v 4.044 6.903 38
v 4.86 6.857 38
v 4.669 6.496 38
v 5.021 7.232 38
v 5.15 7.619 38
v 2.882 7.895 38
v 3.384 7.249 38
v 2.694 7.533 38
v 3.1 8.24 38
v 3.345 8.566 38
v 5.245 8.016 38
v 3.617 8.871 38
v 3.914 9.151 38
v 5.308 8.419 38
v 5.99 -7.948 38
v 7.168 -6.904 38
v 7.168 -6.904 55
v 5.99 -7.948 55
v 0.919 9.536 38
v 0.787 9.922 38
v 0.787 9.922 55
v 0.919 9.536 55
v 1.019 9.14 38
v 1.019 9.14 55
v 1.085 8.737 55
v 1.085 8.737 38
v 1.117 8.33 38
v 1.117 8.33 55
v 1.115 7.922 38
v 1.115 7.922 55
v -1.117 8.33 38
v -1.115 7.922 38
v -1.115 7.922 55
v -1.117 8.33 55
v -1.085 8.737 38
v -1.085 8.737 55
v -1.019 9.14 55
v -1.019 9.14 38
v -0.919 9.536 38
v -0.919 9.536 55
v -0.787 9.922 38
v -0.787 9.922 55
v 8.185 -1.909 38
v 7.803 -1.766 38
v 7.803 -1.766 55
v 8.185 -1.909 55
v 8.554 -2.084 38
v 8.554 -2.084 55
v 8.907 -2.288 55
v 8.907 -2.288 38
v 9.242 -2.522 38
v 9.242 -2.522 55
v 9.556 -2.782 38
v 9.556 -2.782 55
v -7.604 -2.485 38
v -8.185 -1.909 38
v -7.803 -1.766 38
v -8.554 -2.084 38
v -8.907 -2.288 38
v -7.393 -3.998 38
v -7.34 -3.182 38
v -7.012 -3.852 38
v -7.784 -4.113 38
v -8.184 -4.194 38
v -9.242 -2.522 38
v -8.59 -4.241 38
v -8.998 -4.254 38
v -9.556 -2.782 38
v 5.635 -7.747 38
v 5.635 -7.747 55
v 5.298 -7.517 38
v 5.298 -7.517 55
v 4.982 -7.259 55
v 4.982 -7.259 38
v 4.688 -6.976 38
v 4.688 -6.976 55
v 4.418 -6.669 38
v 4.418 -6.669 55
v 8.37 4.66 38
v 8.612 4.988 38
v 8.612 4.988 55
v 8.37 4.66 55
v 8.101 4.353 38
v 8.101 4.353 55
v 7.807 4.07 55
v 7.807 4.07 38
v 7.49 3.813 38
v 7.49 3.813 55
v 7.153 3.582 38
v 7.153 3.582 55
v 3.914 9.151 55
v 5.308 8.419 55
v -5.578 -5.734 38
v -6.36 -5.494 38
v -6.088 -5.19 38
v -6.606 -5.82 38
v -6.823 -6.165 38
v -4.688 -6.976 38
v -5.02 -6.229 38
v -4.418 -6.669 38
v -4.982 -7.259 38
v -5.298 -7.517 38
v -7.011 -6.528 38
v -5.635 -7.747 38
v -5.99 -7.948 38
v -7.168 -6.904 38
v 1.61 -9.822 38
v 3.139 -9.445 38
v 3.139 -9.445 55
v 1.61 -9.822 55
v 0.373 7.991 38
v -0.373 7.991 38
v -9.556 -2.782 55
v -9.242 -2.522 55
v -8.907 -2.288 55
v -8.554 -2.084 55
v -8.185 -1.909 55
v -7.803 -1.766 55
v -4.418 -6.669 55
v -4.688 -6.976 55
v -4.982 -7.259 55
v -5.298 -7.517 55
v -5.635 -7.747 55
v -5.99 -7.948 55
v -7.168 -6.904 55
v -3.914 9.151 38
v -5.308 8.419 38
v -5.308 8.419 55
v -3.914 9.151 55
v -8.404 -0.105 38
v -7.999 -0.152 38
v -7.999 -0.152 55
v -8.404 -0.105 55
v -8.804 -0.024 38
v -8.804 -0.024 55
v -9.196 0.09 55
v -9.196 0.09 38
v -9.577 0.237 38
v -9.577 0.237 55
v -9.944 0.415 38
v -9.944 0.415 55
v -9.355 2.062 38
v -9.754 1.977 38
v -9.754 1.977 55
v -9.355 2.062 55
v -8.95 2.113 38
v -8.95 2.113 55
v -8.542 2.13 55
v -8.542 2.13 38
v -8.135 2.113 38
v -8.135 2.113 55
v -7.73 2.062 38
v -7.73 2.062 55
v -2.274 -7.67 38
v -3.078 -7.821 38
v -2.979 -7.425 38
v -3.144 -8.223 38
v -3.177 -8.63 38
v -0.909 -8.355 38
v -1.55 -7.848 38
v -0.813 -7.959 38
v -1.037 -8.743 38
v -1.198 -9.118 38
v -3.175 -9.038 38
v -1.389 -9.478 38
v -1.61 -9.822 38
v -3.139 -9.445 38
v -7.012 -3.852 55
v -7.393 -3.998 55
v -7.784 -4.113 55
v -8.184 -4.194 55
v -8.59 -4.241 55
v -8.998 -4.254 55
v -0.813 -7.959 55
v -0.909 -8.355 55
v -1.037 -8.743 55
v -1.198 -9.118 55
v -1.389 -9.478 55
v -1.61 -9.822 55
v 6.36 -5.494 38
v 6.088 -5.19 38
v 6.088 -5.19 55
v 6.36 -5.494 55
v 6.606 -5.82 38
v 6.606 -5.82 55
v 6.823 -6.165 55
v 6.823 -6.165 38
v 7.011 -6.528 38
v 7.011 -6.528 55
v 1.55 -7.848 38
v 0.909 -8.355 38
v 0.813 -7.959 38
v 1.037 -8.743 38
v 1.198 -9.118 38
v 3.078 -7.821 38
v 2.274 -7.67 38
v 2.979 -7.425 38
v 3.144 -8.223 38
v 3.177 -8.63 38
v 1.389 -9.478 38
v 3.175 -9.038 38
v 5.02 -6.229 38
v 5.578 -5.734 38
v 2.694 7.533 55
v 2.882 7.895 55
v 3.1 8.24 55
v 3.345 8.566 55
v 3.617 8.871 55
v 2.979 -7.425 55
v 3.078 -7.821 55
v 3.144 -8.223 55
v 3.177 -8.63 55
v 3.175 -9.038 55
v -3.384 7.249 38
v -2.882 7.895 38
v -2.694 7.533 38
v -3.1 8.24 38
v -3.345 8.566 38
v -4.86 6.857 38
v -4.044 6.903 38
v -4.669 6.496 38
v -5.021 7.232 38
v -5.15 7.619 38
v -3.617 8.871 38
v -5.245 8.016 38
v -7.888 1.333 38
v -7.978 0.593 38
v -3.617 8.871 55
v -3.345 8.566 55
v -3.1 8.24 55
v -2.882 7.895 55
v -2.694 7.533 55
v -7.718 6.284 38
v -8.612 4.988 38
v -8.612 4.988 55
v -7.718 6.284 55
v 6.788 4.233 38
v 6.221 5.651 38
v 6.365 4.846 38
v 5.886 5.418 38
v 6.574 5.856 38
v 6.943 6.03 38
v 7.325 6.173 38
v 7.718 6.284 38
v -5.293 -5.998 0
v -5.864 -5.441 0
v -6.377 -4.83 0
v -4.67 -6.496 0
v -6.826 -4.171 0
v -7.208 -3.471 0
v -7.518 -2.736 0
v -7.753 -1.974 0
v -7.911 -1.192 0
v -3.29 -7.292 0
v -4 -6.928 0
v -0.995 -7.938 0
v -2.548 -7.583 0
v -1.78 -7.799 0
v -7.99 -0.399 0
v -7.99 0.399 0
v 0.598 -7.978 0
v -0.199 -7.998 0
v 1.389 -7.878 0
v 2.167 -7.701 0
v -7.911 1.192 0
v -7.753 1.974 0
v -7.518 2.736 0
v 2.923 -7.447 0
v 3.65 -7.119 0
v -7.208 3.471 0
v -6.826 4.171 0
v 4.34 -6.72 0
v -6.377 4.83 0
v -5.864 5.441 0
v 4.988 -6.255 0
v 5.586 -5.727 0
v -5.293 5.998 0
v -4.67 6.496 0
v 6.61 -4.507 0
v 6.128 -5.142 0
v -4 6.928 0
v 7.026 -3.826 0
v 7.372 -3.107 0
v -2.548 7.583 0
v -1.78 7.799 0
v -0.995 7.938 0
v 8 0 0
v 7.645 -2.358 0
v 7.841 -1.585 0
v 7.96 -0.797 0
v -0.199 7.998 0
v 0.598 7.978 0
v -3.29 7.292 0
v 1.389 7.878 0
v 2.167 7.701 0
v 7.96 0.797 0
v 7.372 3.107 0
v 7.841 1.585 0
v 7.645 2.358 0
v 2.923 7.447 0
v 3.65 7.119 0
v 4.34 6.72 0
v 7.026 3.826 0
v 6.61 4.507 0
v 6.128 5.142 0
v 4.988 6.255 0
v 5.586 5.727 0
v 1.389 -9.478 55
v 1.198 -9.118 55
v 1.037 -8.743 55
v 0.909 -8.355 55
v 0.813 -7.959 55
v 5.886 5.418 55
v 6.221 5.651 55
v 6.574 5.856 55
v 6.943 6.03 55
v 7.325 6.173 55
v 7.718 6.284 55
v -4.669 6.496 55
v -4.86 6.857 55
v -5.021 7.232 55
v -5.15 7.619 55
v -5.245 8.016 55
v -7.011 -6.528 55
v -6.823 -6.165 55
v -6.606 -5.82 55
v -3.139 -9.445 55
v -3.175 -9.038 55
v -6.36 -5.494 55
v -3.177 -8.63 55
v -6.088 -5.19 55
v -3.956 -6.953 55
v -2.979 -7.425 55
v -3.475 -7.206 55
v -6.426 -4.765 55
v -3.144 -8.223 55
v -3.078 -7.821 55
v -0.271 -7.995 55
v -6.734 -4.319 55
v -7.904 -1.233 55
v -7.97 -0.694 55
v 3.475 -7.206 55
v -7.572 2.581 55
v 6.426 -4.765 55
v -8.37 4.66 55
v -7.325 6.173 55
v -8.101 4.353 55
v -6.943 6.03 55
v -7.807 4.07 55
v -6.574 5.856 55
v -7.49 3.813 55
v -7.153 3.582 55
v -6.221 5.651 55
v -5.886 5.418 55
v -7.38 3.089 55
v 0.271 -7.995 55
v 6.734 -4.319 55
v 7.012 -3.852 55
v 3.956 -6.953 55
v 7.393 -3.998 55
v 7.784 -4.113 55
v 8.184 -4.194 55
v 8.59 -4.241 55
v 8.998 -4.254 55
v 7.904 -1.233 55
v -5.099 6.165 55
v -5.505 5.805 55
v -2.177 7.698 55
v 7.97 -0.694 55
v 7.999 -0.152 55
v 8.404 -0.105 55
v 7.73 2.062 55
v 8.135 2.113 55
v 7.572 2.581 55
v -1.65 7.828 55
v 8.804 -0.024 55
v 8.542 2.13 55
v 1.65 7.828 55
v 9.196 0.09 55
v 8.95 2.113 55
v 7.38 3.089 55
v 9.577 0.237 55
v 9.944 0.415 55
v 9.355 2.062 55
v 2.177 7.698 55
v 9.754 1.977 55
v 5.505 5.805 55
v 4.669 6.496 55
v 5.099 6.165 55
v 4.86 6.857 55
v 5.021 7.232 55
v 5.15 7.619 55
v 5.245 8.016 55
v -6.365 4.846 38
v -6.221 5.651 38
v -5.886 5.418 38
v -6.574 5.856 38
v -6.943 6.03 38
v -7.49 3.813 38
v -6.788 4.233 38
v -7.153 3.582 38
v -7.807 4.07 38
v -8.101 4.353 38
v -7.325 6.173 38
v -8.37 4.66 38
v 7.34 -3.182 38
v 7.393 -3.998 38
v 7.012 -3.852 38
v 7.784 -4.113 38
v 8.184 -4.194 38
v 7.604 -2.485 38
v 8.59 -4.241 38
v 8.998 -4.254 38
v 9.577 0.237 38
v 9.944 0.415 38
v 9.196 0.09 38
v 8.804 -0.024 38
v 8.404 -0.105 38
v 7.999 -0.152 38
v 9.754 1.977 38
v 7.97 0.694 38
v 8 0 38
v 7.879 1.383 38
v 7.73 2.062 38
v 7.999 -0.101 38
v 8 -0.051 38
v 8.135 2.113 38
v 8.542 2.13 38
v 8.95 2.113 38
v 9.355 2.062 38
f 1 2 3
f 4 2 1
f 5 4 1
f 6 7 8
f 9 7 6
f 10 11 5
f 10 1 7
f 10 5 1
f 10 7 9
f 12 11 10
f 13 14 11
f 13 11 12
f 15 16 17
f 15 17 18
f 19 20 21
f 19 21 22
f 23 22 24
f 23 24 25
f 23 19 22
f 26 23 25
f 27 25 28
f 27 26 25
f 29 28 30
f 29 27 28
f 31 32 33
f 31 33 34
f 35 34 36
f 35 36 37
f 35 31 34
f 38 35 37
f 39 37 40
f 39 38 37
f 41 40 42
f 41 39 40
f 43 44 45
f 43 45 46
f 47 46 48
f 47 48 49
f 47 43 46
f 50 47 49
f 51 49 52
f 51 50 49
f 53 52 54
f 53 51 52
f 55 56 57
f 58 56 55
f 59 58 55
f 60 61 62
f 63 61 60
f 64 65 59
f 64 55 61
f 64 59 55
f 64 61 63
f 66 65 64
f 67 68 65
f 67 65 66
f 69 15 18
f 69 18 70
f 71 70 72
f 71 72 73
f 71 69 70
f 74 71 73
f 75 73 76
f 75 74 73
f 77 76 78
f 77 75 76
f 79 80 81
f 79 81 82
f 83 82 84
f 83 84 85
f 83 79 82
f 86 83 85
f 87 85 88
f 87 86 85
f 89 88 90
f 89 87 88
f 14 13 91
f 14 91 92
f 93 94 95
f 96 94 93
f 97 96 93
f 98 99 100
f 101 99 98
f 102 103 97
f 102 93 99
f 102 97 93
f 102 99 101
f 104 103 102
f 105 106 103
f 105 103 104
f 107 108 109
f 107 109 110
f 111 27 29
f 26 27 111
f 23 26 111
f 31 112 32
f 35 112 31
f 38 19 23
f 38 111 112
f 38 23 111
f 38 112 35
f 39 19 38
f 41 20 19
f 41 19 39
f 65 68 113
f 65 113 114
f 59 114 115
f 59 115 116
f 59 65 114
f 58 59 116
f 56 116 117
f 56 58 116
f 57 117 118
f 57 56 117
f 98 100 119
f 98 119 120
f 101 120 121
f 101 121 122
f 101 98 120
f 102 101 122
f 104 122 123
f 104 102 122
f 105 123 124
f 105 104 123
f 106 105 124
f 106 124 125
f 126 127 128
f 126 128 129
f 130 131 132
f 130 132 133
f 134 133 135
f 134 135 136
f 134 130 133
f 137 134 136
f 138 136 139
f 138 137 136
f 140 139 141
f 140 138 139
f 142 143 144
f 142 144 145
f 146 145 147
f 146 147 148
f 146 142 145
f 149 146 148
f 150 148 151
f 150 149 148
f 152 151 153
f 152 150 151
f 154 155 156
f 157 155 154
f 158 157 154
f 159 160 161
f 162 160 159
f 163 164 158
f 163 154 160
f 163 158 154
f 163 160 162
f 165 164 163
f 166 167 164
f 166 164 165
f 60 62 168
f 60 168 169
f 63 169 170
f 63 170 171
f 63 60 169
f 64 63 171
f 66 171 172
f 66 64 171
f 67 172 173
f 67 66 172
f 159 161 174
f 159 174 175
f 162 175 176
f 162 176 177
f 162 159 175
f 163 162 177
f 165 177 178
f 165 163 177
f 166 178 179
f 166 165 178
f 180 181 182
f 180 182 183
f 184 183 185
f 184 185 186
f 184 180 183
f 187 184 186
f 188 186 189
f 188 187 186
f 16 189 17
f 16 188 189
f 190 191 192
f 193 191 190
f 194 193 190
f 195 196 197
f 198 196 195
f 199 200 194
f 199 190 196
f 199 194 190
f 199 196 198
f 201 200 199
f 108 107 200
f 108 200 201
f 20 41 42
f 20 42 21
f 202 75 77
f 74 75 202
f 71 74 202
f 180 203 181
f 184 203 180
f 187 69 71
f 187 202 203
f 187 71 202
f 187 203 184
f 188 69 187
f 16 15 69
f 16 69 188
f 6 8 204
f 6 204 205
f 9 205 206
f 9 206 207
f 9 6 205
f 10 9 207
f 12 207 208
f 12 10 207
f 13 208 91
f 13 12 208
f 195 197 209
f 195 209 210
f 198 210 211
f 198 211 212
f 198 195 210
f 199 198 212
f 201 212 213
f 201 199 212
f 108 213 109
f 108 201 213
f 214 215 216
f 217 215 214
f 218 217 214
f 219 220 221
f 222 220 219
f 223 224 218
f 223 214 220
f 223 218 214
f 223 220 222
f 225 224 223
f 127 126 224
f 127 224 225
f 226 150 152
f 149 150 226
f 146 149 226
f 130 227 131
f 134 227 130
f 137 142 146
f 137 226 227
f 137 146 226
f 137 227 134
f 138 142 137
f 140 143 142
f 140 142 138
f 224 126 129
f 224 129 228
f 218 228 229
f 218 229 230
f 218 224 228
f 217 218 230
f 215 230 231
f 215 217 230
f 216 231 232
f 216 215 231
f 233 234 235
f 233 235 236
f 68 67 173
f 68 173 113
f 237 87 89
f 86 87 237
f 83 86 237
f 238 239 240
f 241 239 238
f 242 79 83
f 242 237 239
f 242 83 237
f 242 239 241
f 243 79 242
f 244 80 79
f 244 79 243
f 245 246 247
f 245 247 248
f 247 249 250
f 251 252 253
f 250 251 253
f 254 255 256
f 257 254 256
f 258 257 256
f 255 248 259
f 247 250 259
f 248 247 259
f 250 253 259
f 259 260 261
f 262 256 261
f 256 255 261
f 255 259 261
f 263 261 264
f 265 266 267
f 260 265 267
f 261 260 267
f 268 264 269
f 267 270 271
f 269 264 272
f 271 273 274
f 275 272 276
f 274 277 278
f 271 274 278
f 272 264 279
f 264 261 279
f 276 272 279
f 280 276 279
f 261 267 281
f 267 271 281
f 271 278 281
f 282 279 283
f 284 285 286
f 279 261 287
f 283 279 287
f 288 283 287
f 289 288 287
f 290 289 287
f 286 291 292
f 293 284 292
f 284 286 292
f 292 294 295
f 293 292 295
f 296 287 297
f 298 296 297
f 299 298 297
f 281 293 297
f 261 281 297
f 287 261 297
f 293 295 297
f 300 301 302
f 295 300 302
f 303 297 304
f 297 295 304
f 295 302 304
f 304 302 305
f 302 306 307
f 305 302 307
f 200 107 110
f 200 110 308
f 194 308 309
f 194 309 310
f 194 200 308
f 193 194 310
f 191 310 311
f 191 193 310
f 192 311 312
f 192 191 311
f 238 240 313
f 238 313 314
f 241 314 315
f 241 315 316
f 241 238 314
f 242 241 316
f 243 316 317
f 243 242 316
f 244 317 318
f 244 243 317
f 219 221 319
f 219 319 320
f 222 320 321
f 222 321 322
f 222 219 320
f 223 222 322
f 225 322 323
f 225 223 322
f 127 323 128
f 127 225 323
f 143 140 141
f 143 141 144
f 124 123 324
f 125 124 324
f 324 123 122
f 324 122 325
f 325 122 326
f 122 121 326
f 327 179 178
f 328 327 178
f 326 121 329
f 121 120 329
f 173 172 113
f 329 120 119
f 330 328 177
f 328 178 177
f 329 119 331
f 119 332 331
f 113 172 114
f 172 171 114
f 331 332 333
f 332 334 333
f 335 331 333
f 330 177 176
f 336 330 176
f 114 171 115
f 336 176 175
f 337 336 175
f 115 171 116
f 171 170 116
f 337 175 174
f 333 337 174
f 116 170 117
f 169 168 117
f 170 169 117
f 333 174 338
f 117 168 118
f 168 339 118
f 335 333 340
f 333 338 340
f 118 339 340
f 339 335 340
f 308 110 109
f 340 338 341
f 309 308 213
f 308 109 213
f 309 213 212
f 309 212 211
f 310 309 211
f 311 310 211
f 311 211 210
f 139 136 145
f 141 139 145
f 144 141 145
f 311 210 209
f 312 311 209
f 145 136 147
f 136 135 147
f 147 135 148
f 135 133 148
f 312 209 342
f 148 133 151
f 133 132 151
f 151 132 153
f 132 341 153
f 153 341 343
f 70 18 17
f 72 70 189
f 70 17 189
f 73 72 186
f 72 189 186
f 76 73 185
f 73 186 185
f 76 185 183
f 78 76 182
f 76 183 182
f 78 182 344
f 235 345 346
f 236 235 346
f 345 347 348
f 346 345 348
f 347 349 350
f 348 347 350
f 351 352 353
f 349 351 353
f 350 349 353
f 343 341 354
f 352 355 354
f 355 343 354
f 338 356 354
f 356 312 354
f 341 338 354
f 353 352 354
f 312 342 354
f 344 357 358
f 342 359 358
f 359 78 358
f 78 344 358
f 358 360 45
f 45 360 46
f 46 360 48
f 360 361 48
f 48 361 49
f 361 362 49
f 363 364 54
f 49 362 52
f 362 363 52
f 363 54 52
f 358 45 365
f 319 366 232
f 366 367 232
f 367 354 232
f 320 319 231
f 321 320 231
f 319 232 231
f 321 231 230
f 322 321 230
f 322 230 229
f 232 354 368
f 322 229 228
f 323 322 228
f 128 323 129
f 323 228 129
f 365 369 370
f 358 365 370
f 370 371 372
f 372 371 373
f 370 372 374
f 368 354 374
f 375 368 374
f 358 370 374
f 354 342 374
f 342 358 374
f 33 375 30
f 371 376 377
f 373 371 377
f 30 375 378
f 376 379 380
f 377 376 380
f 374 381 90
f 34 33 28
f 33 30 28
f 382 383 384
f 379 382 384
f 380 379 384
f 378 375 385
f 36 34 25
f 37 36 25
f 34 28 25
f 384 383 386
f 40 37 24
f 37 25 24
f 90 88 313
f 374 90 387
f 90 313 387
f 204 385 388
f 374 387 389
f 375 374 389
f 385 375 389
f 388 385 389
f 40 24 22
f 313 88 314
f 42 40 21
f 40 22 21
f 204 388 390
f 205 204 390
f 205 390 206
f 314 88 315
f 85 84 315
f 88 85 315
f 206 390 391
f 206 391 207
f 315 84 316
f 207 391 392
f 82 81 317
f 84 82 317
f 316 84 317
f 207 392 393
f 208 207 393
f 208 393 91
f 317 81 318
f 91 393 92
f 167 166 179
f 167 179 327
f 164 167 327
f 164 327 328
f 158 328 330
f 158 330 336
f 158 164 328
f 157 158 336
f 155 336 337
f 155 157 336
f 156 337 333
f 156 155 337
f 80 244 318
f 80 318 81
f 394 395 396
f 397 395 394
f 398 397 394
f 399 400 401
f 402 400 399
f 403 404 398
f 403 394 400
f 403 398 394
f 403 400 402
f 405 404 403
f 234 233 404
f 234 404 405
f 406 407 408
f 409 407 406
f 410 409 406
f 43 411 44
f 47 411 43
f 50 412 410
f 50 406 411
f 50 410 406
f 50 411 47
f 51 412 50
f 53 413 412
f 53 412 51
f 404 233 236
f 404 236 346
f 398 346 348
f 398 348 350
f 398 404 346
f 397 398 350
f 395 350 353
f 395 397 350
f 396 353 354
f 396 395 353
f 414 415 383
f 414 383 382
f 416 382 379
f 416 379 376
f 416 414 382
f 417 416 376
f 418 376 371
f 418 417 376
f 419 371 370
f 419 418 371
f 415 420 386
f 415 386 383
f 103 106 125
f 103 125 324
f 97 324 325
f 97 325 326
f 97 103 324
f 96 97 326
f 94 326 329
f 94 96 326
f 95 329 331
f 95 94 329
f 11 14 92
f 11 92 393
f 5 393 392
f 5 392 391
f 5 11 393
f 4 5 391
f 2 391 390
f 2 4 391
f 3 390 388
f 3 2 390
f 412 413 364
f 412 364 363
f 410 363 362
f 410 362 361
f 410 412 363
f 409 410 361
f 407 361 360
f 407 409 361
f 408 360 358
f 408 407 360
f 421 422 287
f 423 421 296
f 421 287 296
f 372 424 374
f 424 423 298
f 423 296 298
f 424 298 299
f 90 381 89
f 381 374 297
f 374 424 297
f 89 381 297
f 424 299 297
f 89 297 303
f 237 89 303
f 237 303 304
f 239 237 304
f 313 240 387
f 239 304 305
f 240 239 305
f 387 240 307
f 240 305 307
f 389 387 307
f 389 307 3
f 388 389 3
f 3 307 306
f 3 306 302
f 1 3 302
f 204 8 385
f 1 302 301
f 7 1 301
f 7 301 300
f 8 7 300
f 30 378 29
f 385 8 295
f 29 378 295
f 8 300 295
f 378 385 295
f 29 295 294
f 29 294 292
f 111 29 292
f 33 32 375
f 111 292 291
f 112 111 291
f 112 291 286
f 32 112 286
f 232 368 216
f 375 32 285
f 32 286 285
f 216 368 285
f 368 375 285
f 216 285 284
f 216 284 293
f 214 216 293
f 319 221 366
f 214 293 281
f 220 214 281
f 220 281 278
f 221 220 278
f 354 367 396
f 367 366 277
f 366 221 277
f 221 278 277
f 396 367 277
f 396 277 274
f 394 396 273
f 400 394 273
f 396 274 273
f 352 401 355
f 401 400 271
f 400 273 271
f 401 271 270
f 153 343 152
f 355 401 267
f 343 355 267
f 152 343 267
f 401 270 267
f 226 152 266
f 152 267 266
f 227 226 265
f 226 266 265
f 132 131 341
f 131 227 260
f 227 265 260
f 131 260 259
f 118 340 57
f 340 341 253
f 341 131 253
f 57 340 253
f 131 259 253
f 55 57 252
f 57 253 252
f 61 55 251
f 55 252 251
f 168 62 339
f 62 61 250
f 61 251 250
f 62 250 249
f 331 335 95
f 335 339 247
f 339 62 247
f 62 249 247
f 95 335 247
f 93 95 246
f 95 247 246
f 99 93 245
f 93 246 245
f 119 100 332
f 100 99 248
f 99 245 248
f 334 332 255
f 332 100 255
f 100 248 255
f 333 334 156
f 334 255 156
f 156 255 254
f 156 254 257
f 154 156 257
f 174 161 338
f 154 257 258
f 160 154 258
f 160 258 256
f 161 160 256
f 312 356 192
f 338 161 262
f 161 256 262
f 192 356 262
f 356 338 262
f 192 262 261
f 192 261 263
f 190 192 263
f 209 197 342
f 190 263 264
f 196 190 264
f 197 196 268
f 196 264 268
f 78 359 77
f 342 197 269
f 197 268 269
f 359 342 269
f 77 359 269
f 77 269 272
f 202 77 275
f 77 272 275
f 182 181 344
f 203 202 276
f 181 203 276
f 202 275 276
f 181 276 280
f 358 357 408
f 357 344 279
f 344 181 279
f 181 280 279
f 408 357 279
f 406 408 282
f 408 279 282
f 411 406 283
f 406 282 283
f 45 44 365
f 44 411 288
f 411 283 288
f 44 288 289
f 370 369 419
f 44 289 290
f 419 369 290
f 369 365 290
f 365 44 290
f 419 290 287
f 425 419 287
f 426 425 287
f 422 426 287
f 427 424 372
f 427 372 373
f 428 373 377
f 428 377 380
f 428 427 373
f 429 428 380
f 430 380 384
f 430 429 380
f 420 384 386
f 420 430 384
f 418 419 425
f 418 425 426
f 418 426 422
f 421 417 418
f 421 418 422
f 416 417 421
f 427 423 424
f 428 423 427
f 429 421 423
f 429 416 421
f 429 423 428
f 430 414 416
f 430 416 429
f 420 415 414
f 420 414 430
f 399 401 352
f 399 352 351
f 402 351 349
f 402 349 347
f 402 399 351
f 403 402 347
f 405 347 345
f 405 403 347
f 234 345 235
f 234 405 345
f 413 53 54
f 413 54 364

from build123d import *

# Parameters (mm, degrees)
SKETCH1_R           = 8
BOSS_EXTRUDE1_DEPTH = 55
BOSS_EXTRUDE2_START = -17
BOSS_EXTRUDE2_DEPTH = 17
CIRPATTERN1_COUNT   = 13


with BuildPart() as part:
    # Sketch1 → Boss-Extrude1 (new body)
    with BuildSketch(Plane.XY):
        Circle(SKETCH1_R)
    extrude(amount=BOSS_EXTRUDE1_DEPTH)

    # Sketch2 → Boss-Extrude2 (add)
    with BuildSketch(Plane.XY.offset(55).offset(BOSS_EXTRUDE2_START)):
        with BuildLine():
            Line((-0.787121101, 9.92163467), (0.787121101, 9.92163467))
            ThreePointArc((0.787121101, 9.92163467), (1.056170344, 8.938993112), (1.115168142, 7.921893714))
            ThreePointArc((1.115168142, 7.921893714), (0, 8), (-1.115168142, 7.921893714))
            ThreePointArc((-1.115168142, 7.921893714), (-1.056170344, 8.938993112), (-0.787121101, 9.92163467))
        make_face()
    boss_extrude2 = extrude(amount=BOSS_EXTRUDE2_DEPTH)

    # CirPattern1: Boss-Extrude2 ×13 about axis
    cirpattern1_axis = Axis((0, 0, 0), (0, 0, 1))
    for i in range(1, CIRPATTERN1_COUNT):
        add(boss_extrude2.rotate(cirpattern1_axis, i * 360 / CIRPATTERN1_COUNT))


solid = part.part
